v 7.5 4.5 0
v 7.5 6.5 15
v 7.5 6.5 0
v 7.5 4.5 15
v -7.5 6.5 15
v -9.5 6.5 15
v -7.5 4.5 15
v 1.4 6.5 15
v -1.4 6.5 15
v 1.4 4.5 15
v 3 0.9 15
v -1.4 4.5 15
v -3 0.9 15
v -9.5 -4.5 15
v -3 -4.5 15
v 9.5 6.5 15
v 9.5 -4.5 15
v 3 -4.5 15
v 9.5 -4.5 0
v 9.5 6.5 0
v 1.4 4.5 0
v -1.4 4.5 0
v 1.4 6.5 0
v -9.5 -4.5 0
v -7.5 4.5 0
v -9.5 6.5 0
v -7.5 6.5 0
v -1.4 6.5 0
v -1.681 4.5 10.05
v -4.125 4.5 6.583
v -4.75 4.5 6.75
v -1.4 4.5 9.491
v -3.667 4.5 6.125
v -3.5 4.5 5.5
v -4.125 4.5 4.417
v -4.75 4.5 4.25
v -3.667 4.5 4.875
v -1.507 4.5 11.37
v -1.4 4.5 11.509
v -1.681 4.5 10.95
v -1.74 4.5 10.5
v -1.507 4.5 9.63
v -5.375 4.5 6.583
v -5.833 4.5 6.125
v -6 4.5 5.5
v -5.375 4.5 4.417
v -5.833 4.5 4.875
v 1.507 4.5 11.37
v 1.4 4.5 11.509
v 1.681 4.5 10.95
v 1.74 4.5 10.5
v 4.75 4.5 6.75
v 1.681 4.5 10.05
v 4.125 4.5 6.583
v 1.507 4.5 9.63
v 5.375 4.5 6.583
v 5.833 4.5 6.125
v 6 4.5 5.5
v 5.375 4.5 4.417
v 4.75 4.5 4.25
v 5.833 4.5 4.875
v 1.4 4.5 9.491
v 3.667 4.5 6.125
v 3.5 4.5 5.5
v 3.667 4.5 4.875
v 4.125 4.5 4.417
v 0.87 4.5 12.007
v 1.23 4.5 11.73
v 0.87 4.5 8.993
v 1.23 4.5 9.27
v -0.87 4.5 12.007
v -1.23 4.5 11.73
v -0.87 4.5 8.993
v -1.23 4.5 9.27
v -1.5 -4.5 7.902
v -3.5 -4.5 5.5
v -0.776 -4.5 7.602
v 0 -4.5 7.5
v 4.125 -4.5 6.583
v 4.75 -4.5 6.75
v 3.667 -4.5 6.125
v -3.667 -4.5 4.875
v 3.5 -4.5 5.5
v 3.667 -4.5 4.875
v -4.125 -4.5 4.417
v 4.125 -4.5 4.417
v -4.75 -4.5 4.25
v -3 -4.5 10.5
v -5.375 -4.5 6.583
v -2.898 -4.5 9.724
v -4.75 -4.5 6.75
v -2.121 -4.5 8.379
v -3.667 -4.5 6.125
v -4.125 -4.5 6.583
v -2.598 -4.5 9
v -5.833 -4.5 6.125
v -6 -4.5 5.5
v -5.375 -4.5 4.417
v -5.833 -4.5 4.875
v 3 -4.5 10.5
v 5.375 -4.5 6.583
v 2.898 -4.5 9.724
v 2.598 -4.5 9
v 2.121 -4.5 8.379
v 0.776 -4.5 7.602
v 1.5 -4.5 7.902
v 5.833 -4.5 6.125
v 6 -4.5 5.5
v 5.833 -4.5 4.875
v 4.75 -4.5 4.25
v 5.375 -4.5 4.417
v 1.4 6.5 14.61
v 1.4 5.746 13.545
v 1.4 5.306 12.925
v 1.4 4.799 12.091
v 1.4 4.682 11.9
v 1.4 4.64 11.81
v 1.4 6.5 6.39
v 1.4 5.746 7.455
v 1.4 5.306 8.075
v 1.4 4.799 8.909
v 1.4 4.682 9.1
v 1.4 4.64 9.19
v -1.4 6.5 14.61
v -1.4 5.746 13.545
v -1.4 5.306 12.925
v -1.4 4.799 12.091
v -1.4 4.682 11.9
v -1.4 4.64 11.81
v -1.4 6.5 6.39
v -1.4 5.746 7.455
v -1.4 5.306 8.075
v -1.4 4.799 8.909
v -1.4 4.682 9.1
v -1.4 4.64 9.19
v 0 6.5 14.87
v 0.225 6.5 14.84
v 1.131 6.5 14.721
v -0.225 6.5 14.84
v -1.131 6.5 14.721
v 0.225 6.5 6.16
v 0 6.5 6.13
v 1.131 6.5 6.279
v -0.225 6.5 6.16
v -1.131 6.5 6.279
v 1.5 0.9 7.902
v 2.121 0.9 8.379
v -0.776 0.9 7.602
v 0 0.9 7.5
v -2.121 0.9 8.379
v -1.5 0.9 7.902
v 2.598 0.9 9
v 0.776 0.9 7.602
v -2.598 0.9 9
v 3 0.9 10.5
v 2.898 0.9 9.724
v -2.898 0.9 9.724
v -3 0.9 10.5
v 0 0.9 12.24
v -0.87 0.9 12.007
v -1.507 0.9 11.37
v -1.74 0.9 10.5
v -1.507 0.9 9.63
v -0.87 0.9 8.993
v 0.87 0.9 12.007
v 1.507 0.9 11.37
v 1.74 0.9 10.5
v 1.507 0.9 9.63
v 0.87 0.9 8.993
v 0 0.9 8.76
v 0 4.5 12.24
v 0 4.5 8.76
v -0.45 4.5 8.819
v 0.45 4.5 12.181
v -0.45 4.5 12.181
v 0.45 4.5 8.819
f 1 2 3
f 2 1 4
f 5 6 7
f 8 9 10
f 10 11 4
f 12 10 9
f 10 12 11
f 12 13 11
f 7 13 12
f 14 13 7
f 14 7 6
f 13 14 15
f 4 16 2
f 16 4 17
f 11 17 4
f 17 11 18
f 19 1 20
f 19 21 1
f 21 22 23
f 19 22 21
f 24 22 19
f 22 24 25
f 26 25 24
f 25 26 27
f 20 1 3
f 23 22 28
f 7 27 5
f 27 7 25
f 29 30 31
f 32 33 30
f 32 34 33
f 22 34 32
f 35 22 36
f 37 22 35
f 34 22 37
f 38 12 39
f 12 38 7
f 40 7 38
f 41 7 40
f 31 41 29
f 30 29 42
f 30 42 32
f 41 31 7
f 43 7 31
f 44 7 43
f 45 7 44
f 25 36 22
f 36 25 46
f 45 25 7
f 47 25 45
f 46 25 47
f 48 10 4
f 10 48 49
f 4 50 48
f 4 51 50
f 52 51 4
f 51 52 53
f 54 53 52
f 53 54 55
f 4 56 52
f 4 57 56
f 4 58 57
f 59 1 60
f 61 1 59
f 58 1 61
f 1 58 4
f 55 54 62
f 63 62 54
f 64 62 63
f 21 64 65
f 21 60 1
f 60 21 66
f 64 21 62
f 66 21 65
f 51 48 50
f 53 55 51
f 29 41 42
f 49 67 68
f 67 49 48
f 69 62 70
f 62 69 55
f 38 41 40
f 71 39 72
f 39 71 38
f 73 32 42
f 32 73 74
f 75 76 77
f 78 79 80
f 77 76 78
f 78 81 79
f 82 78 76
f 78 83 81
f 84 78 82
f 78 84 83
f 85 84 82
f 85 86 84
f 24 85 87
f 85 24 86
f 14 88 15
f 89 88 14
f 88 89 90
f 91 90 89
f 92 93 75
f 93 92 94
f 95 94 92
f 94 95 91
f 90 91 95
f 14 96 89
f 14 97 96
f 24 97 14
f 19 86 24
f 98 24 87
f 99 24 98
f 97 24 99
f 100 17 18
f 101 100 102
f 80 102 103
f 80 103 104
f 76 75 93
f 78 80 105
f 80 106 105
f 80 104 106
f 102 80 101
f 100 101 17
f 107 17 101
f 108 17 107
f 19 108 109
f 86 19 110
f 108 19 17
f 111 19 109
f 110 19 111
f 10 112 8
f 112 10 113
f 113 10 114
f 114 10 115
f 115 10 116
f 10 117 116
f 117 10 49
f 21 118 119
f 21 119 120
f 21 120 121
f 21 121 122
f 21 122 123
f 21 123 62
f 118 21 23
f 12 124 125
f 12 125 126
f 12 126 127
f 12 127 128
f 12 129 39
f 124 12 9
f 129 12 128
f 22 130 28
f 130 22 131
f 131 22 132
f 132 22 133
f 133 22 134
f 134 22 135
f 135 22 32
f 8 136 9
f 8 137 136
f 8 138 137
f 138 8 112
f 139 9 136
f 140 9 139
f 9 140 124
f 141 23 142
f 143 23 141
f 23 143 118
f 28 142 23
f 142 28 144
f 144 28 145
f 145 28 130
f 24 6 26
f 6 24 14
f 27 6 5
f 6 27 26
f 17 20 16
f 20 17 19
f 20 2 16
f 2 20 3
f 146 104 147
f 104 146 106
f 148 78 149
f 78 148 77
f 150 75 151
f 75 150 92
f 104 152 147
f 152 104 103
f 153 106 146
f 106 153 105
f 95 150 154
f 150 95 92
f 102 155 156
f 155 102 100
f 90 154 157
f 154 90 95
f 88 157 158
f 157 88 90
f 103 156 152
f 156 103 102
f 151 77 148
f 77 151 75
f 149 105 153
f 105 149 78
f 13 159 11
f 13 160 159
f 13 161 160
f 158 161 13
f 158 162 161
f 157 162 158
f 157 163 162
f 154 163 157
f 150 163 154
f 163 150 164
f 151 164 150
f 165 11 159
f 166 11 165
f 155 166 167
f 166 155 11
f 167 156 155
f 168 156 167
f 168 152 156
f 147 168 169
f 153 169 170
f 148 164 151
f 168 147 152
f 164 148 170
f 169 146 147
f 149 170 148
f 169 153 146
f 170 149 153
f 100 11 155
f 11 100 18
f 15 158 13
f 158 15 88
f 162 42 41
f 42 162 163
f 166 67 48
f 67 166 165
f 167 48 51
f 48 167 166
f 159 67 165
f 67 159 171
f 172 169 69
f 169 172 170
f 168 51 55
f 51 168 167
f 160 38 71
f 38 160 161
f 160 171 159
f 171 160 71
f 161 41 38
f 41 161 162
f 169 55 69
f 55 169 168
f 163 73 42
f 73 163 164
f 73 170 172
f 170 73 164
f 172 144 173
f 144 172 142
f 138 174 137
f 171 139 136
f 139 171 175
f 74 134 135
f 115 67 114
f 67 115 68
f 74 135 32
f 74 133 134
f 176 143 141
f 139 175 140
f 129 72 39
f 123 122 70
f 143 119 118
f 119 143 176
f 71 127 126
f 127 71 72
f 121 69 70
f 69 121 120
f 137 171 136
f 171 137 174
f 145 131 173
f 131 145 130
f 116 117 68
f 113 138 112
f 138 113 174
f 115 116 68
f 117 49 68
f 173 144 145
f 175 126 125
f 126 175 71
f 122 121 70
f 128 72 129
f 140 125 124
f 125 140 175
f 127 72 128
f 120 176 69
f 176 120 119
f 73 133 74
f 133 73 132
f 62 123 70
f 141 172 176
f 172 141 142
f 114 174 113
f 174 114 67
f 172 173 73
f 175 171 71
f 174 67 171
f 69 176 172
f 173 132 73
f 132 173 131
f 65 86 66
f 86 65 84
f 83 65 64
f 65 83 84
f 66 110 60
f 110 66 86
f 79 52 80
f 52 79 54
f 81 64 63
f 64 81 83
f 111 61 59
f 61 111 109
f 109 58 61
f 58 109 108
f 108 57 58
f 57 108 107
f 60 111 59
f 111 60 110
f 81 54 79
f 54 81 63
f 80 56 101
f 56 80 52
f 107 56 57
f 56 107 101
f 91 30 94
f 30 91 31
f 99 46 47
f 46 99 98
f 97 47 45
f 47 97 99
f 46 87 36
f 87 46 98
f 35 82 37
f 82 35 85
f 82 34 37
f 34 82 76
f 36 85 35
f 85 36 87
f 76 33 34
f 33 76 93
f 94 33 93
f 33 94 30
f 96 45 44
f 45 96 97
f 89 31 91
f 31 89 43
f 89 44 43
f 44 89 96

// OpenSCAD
// file: microswitch.scad
/**
 * @author Johann Rocholl <johann@rocholl.net>
 * @license GPL-3.0
 */

// Don't print this file, purchase real micro switches
// e.g. Honeywell ZM10B10A01 or OMRON SS-5 or similar.

module microswitch() {
  difference() {
    union() {
      translate([0, 0, 2.5])
        cube([19.8, 6, 10], center=true);
      translate([2.5, 0.5, 6])
        cube([2, 3.5, 5], center=true);
      for (x = [-8, -1, 8]) {
        translate([x, 0, 0])
          cube([0.6, 3.2, 13], center=true);
      }
    }
    for (x = [-9.5/2, 9.5/2]) {
      translate([x, 0, 0]) rotate([90, 0, 0])
        cylinder(r=2.5/2, h=20, center=true, $fn=12);
    }
  }
}

microswitch();
// file: configuration.scad
// Increase this if your slicer or printer make holes too tight.
extra_radius = 0.1;

// OD = outside diameter, corner to corner.
m3_nut_od = 6.1;
m3_nut_radius = m3_nut_od/2 + 0.2 + extra_radius;
m3_washer_radius = 3.5 + extra_radius;
m3_washer_height = 0.65;

// Major diameter of metric 3mm thread.
m3_head_height = 3;
m3_major = 2.88;
m3_radius = m3_major/2 + extra_radius;
m3_wide_radius = m3_major/2 + extra_radius + 0.2;

// NEMA17 stepper motors.
motor_shaft_diameter = 5;
motor_shaft_radius = motor_shaft_diameter/2 + extra_radius;

// Frame brackets. M3x8mm screws work best with 3.6 mm brackets.
thickness = 3.6;

// OpenBeam or Misumi. Currently only 15x15 mm, but there is a plan
// to make models more parametric and allow 20x20 mm in the future.
extrusion = 15;

// Placement for the NEMA17 stepper motors.
motor_offset = 44;
motor_length = 47;
// main file
include <configuration.scad>;

use <microswitch.scad>;

thickness = 9;  // 1mm thicker than linear rail.
width = 15;  // Same as vertical extrusion.
height = 15;

module endstop() {
  difference() {
    union() {
      cube([width, thickness, height], center=true);
      translate([0, 0, -height/4])
        cube([width+2, thickness, height/2], center=true);
      translate([0, 2, 0])
        cube([2.8, thickness, height], center=true);
		// L. Wing
		translate([-width/2-1, 1, 0])
			cube([2, thickness+2, height], center=true);
		// R. Wing
		translate([width/2+1, 1, 0])
			cube([2, thickness+2, height], center=true);
    }
    translate([0, 0, 3]) rotate([90, 0, 0]) {
      cylinder(r=m3_wide_radius, h=20, center=true, $fn=12);
      translate([0, 0, 3.6-thickness/2]) {
        cylinder(r=3, h=10, $fn=24);
        translate([0, 5, 5])
          cube([6, 10, 10], center=true);
      }
      translate([0, 0, -thickness/2]) scale([1, 1, -1])
        cylinder(r1=m3_wide_radius, r2=7, h=4, $fn=24);
    }
    translate([0, -3-thickness/2, -2]) rotate([0, 180, 0]) {
      % microswitch();
      for (x = [-9.5/2, 9.5/2]) {
        translate([x, 0, 0]) rotate([90, 0, 0])
          cylinder(r=2.5/2, h=40, center=true, $fn=12);
      }
    }
  }
}

translate([0, 0, height/2]) endstop();
